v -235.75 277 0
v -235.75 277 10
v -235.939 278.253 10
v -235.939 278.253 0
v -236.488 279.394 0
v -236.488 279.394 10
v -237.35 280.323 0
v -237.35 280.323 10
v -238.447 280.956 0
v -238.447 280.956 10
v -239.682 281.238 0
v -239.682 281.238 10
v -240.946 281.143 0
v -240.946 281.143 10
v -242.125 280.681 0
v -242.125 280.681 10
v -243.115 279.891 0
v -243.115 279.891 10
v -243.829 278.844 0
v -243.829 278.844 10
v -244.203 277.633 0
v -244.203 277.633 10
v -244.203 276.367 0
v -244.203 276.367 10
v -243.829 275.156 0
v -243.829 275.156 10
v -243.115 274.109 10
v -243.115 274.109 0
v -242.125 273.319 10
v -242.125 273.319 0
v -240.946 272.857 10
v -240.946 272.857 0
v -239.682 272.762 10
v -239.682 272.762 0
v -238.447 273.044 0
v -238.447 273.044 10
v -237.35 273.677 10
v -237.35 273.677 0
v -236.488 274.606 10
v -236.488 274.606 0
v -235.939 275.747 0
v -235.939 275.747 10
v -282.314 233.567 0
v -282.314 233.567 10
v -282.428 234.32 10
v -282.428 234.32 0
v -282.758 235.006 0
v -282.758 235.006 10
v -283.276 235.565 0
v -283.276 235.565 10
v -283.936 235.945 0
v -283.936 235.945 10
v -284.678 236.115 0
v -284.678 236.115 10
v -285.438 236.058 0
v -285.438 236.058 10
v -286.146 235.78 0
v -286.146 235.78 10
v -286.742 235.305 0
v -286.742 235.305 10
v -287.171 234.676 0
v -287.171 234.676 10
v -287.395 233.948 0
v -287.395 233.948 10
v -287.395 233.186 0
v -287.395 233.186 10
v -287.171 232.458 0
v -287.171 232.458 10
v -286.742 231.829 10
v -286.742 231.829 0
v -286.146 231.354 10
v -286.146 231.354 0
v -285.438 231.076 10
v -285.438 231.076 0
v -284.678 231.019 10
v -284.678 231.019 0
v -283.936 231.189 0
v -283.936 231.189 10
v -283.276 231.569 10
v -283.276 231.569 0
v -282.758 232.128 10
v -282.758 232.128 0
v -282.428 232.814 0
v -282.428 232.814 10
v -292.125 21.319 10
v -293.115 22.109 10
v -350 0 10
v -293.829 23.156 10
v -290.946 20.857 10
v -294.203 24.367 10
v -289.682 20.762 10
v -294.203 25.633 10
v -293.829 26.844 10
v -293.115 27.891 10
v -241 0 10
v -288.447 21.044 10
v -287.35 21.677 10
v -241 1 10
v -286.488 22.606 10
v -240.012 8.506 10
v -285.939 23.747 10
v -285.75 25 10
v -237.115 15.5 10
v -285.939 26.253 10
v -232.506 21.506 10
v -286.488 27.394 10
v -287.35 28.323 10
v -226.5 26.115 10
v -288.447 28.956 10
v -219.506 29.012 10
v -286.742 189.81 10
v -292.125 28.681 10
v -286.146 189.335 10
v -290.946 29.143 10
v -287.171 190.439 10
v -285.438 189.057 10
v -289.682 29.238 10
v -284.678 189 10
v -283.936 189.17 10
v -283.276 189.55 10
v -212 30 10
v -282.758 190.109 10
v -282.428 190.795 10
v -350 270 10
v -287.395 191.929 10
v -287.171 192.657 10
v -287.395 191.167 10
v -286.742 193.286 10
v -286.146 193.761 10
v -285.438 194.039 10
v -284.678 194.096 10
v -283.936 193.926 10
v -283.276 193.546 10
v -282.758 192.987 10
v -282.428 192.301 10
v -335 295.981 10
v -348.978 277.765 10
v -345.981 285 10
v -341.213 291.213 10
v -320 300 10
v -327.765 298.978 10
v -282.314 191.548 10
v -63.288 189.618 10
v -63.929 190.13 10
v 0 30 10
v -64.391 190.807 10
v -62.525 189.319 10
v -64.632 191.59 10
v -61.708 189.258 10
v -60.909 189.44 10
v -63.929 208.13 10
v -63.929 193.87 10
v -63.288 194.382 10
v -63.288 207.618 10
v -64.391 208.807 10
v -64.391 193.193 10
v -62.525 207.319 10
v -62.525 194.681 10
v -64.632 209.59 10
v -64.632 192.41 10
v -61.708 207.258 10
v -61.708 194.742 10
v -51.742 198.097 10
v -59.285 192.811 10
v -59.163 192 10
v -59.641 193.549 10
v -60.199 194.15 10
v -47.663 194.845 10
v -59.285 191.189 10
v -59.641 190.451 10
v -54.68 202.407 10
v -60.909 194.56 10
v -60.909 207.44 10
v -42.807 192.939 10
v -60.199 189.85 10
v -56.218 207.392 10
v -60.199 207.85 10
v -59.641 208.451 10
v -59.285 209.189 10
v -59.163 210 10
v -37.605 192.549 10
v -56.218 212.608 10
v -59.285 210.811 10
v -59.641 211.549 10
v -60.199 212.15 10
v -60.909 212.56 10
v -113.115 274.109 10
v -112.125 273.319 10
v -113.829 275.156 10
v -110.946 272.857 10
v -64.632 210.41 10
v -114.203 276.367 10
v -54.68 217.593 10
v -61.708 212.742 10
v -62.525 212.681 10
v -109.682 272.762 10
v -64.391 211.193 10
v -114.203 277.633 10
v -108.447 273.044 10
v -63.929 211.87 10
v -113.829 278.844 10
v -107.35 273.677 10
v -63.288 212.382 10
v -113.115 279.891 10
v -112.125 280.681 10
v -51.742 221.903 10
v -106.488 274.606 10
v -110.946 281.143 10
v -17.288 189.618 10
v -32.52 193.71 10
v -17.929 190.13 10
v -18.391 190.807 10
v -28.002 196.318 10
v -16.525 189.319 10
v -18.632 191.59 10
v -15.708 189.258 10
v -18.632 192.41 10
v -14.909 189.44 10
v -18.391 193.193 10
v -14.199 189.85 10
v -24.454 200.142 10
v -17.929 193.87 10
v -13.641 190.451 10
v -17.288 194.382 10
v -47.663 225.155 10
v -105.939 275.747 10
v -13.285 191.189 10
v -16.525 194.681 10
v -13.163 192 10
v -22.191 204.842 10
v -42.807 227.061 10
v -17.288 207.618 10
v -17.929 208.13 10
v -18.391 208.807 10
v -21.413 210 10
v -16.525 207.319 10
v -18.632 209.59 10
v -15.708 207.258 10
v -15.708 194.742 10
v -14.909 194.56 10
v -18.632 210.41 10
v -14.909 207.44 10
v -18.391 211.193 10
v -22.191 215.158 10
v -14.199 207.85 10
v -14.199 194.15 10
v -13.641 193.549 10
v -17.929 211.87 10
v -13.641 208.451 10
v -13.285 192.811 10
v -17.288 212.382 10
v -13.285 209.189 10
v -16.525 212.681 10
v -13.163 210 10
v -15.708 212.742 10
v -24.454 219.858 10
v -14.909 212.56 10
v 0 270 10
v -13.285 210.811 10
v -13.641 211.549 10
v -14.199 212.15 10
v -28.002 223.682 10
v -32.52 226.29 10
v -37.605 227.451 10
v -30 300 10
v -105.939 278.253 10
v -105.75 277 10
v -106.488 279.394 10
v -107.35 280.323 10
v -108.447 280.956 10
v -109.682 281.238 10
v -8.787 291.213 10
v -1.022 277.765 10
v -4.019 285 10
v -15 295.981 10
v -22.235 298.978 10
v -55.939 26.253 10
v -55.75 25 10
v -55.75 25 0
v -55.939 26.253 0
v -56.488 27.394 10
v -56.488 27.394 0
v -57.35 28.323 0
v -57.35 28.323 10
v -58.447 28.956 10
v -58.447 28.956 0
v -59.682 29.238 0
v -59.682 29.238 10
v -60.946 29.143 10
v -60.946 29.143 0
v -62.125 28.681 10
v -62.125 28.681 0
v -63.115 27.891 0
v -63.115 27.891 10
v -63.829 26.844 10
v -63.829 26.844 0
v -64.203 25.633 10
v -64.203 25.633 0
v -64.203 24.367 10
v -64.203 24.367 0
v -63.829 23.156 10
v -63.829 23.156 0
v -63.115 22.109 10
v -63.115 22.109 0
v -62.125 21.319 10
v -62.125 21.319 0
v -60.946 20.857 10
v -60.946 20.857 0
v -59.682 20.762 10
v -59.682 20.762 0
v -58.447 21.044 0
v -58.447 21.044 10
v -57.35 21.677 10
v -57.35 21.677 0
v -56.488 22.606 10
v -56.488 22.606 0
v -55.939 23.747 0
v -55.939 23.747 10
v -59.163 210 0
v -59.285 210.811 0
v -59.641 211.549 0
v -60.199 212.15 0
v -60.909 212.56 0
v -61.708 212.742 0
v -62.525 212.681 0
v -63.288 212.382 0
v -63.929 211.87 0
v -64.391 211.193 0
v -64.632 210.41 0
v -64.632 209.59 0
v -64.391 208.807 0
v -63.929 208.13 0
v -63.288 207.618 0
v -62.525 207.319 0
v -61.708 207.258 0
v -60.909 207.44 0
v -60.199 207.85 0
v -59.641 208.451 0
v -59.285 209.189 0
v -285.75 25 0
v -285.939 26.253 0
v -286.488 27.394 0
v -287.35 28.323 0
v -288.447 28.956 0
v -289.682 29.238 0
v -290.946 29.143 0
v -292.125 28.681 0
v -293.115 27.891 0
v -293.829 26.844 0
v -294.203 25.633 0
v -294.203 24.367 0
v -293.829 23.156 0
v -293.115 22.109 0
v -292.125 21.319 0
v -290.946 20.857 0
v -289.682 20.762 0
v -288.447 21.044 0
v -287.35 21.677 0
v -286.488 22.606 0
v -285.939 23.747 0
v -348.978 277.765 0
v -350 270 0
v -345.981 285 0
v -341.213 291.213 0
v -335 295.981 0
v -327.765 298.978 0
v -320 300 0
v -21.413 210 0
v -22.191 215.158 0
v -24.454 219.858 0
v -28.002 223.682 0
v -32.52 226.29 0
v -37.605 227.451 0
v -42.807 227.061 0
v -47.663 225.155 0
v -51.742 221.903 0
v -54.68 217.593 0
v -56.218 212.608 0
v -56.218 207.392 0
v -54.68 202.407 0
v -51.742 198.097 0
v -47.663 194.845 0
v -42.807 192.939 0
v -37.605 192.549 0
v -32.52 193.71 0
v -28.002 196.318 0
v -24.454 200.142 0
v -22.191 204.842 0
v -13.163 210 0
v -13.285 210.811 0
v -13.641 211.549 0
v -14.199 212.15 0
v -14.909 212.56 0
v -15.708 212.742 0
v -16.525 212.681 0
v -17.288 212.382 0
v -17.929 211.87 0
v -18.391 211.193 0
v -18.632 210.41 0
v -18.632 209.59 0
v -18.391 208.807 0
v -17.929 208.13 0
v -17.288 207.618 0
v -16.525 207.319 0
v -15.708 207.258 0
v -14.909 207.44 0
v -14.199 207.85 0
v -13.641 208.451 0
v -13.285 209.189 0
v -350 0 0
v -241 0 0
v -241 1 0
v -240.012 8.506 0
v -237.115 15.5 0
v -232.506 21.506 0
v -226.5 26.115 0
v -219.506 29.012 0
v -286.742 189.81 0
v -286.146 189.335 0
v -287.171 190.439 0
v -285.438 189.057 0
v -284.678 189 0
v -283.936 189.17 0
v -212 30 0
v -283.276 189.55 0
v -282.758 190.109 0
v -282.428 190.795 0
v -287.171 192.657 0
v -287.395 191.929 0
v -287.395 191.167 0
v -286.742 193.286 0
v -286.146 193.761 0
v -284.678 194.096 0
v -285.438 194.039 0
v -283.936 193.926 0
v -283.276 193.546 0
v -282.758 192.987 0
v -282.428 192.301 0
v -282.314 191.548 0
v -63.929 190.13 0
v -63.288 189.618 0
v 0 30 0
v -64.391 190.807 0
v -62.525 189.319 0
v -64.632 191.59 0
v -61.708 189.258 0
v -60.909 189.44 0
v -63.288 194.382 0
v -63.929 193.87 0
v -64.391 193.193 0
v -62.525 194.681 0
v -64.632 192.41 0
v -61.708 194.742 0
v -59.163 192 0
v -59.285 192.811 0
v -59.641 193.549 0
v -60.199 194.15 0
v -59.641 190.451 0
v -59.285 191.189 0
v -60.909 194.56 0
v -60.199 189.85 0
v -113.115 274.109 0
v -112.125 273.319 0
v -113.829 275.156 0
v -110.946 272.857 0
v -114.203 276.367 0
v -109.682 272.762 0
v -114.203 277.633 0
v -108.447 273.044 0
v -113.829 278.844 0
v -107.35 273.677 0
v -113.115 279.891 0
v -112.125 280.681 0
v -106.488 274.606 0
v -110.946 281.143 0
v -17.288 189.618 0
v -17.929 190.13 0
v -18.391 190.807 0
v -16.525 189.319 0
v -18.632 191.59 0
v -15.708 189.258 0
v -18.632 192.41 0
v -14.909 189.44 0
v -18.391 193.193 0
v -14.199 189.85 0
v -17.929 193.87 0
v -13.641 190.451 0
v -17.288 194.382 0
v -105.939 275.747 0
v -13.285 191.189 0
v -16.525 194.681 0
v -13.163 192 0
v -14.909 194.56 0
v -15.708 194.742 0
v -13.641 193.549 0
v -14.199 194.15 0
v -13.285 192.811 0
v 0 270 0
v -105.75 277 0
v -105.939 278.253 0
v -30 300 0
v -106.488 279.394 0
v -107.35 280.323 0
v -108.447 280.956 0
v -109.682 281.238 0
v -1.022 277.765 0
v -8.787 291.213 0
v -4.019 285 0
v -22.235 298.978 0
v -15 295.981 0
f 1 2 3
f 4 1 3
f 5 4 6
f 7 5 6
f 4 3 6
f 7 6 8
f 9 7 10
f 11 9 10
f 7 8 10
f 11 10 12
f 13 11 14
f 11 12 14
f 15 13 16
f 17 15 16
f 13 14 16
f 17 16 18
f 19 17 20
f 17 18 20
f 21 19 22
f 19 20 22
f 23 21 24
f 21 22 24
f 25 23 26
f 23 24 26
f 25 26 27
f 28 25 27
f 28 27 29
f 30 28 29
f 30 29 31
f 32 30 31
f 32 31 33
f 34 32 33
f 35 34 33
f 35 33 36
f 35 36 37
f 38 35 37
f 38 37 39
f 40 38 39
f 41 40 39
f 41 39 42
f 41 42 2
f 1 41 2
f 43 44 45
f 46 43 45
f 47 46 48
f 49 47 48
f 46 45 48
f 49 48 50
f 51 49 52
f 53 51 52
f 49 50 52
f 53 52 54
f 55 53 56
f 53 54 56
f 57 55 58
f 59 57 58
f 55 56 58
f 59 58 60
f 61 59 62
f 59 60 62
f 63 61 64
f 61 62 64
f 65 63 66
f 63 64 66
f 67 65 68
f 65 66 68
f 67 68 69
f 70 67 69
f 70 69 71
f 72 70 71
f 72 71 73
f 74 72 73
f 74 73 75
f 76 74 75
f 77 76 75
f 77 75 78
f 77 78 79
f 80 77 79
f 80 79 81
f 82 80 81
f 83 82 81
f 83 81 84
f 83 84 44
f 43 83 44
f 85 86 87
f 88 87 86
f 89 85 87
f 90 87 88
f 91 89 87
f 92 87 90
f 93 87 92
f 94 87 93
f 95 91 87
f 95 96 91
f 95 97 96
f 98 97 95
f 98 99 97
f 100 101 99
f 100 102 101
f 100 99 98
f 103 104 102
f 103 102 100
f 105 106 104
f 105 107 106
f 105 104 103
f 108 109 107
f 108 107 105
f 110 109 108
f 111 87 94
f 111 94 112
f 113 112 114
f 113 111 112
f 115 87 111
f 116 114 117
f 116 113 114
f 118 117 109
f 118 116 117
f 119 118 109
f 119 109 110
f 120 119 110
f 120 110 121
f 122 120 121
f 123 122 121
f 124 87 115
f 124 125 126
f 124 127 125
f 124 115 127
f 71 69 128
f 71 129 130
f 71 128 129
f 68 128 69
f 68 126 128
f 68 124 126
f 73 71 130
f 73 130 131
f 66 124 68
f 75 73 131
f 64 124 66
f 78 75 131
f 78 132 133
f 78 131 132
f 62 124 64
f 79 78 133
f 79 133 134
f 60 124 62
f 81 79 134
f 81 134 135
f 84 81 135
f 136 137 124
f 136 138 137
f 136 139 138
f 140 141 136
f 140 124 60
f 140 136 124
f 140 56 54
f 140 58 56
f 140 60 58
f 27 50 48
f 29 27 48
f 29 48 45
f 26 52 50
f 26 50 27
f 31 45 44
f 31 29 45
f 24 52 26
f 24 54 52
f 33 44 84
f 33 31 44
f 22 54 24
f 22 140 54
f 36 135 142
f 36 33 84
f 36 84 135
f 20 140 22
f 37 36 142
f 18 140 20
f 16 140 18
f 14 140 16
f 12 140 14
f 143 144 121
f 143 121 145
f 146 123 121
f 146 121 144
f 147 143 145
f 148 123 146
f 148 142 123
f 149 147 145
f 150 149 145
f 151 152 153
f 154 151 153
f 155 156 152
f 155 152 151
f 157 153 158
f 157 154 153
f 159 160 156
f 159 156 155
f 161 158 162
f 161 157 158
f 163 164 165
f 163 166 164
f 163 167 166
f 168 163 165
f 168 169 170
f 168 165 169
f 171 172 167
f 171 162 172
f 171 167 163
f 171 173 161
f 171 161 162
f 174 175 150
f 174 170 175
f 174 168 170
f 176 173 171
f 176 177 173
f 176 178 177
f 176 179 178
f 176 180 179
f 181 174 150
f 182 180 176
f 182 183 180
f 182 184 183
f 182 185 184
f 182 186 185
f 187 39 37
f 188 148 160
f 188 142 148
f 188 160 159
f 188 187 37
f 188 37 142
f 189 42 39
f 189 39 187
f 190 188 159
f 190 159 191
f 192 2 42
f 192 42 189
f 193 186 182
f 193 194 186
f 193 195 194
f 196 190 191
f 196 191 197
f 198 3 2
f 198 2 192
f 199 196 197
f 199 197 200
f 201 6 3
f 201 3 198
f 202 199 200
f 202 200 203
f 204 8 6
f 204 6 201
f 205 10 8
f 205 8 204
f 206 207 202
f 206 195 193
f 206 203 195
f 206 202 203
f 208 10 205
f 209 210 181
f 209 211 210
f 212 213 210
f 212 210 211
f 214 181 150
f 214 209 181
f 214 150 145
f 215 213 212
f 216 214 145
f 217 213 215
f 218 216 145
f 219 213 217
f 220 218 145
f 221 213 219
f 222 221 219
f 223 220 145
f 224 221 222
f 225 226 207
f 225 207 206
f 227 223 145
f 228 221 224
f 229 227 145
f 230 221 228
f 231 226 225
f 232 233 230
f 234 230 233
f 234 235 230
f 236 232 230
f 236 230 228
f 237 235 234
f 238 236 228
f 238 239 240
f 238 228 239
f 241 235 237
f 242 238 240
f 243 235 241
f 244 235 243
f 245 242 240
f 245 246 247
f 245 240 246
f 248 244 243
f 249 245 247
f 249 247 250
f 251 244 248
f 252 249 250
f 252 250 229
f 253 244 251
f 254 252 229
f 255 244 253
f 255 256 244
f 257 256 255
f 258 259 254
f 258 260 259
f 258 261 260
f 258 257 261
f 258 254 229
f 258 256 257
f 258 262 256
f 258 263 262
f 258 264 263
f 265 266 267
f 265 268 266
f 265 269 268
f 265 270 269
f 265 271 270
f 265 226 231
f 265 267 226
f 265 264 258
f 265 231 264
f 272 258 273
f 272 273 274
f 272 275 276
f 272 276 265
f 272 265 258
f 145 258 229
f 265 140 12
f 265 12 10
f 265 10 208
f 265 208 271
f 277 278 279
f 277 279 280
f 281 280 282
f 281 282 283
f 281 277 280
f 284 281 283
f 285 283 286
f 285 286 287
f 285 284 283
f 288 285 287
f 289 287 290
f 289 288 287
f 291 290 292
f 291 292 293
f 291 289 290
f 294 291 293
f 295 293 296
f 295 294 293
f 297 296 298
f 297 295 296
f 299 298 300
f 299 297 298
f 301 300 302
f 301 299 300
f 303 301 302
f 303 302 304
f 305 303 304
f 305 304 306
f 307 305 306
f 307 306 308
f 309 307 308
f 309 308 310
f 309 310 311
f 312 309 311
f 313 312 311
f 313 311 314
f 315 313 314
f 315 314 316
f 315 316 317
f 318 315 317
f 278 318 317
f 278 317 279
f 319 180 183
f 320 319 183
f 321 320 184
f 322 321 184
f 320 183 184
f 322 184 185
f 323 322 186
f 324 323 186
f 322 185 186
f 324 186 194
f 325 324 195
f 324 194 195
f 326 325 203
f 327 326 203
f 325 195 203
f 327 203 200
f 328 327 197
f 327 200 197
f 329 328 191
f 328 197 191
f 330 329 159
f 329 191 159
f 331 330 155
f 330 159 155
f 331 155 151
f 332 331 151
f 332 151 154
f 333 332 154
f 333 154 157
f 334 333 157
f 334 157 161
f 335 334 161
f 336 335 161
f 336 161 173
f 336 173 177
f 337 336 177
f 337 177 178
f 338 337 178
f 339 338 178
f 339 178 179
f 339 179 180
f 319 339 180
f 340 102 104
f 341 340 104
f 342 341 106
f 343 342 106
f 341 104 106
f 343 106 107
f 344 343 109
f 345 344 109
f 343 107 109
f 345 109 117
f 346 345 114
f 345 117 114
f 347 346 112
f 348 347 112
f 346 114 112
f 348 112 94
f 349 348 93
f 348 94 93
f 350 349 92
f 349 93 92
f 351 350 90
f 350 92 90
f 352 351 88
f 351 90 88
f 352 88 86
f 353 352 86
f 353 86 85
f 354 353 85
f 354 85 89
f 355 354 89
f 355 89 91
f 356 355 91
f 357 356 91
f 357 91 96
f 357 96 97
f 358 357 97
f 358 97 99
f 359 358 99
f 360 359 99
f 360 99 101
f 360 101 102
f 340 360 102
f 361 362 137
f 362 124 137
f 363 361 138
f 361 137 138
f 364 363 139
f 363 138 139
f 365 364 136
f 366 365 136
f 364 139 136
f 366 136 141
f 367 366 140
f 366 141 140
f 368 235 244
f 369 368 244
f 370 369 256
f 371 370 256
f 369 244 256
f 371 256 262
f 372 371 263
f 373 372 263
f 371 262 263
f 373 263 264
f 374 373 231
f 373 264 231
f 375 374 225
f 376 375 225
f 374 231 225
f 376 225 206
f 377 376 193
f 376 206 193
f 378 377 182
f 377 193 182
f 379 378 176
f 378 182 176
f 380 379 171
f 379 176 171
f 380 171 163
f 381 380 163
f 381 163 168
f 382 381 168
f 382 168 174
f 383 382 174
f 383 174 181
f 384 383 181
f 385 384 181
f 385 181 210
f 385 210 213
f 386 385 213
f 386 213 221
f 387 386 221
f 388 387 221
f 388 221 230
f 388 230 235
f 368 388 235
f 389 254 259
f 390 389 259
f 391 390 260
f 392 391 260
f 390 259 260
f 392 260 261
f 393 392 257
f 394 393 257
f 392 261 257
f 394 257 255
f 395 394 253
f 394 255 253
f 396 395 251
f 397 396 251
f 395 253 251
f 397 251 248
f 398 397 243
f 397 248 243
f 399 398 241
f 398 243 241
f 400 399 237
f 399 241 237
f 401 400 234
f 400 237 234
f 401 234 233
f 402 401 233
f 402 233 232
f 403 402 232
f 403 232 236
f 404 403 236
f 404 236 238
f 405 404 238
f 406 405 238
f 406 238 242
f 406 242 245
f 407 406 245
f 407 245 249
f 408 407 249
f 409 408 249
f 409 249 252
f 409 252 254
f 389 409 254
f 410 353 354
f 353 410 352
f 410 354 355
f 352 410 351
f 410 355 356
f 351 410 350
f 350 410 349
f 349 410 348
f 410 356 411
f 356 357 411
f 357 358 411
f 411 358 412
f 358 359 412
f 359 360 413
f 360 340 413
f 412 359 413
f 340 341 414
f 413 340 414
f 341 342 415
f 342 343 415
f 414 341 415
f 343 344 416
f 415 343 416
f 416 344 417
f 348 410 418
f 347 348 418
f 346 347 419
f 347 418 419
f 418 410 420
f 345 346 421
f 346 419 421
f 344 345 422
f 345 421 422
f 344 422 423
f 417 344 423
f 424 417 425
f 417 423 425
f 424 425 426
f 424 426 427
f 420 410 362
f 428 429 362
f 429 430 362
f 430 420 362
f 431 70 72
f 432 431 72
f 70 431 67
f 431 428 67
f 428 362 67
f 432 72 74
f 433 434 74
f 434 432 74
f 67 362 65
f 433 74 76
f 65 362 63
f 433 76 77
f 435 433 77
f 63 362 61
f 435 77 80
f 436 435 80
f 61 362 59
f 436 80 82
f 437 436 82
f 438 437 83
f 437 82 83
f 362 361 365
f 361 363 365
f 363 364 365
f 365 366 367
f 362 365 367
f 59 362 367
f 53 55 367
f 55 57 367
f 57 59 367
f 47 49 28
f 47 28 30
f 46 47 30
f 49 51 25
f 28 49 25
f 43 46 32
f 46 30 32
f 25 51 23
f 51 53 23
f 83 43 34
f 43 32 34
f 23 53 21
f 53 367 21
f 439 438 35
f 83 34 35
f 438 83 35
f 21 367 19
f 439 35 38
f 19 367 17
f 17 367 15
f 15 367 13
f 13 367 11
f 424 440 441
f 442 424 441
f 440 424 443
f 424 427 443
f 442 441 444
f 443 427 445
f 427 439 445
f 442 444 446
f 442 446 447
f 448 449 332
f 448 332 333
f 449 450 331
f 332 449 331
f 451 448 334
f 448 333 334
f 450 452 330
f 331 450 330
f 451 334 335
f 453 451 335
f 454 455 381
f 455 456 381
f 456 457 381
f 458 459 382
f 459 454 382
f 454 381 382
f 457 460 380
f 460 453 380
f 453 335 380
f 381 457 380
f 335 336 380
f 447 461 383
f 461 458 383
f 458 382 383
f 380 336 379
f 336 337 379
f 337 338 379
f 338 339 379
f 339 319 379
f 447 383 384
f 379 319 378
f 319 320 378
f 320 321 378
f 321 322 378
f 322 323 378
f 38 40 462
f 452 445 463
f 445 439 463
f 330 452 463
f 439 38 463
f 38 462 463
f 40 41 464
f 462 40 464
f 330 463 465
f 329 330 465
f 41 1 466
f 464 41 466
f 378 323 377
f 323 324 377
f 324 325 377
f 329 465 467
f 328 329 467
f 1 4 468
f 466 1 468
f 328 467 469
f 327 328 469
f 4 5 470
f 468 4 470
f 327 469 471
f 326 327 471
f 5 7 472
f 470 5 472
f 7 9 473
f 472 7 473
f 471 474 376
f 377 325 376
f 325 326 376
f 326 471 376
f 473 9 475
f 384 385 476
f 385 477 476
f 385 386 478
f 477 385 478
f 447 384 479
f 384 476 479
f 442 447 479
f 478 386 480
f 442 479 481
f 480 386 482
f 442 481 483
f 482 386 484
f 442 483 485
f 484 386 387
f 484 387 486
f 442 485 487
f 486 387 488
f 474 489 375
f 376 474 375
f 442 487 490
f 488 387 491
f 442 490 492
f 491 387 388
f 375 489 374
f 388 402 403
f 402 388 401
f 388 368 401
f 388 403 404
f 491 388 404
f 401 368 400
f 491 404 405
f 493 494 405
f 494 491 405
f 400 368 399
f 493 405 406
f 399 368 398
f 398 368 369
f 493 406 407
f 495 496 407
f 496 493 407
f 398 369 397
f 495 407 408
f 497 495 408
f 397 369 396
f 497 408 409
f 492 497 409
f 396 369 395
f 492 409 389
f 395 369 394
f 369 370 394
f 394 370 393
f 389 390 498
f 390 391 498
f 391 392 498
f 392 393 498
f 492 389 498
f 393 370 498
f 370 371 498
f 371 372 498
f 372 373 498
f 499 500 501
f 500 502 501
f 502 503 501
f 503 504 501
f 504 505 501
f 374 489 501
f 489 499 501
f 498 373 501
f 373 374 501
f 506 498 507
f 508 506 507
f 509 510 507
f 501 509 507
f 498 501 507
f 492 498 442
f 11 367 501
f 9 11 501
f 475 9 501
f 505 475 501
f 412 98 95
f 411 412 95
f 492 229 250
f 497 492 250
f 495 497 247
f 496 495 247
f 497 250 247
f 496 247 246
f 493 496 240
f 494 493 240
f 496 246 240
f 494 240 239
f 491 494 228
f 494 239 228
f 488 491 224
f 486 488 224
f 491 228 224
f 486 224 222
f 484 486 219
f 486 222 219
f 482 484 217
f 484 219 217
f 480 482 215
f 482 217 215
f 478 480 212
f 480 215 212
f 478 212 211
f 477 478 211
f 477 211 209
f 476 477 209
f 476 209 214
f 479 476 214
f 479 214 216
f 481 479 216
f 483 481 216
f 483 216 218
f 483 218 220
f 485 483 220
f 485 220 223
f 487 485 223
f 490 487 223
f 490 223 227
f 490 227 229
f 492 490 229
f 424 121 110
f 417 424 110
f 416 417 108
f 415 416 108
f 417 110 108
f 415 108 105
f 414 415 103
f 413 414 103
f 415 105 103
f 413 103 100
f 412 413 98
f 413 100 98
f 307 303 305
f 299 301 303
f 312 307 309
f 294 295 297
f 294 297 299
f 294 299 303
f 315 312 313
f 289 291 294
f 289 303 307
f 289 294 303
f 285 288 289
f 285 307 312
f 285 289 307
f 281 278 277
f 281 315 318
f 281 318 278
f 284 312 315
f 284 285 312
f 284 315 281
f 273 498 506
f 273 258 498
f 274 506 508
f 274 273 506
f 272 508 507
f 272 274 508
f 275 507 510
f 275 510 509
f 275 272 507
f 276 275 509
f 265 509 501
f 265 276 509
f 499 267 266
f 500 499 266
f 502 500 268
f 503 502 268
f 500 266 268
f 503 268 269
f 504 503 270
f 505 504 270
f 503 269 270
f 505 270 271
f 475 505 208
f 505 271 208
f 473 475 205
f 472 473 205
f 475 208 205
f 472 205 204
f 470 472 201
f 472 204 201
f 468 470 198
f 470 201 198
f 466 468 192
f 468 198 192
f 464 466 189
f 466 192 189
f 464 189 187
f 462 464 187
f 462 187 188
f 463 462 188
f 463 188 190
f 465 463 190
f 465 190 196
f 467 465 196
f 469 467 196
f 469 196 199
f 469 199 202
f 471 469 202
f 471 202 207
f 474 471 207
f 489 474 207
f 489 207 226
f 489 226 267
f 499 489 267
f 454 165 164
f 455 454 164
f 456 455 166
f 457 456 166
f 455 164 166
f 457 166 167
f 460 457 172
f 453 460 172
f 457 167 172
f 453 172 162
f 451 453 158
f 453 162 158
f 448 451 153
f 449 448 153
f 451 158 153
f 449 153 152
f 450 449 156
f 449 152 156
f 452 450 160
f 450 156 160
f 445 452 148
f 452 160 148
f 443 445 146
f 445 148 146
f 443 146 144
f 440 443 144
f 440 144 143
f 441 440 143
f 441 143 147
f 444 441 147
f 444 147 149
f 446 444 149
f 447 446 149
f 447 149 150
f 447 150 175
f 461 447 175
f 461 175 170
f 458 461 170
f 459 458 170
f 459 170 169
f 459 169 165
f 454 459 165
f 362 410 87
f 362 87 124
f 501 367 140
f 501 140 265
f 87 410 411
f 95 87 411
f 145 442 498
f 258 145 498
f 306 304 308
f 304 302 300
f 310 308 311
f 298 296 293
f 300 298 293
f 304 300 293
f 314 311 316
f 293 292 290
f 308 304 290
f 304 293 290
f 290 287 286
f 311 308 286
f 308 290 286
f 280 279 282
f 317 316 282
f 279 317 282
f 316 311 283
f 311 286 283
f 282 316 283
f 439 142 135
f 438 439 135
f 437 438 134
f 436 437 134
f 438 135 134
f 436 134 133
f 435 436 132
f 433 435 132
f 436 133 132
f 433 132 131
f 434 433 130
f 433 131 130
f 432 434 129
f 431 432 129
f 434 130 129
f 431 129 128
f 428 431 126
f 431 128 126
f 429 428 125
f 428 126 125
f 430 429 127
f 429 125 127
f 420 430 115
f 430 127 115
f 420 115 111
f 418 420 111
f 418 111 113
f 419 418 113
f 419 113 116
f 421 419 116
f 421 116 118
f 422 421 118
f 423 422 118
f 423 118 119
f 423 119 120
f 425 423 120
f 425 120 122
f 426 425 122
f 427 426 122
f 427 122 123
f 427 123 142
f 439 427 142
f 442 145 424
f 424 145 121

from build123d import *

# Parameters (mm, degrees)
CROQUIS1_W              = 350
CROQUIS1_H              = 300
SALIENTE_EXTRUIR1_DEPTH = 10
REDONDEO4_R             = 30
CROQUIS2_R              = 17.5
CROQUIS2_R_2            = 4.25
CROQUIS2_R_3            = 2.555
CROQUIS2_R_4            = 2.75
CORTAR_EXTRUIR1_DEPTH   = 11


with BuildPart() as part:
    # Croquis1 → Saliente-Extruir1 (new body)
    with BuildSketch(Plane.XY):
        with Locations((-175, 150)):
            Rectangle(CROQUIS1_W, CROQUIS1_H)
    extrude(amount=SALIENTE_EXTRUIR1_DEPTH)

    # Redondeo4
    redondeo4_edges = [part.edges().sort_by_distance(p)[0] for p in [
        (-350, 300, 5),
        (0, 300, 5),
    ]]
    fillet(redondeo4_edges, radius=REDONDEO4_R)

    # Croquis2 → Cortar-Extruir1 (cut, through all)
    with BuildSketch(Plane.XY.offset(10)):
        with Locations((-38.913195394, 210)):
            Circle(CROQUIS2_R)
        with Locations((-290, 25)):
            Circle(CROQUIS2_R_2)
        with Locations((-240, 277)):
            Circle(CROQUIS2_R_2)
        with Locations((-110, 277)):
            Circle(CROQUIS2_R_2)
        with Locations((-355.107, 233.567)):
            Circle(CROQUIS2_R_3)
        with Locations((-284.869, 233.567)):
            Circle(CROQUIS2_R_3)
        with Locations((-284.869, 191.548)):
            Circle(CROQUIS2_R_3)
        with Locations((-355.107, 191.548)):
            Circle(CROQUIS2_R_3)
        with Locations((-15.913195394, 210)):
            Circle(CROQUIS2_R_4)
        with Locations((-15.913195394, 192)):
            Circle(CROQUIS2_R_4)
        with Locations((-61.913195394, 210)):
            Circle(CROQUIS2_R_4)
        with Locations((-61.913195394, 192)):
            Circle(CROQUIS2_R_4)
        with BuildLine():
            Line((-241, 0), (180.991, 0))
            Line((180.991, 0), (180.991, 1))
            ThreePointArc((180.991, 1), (172.497096654, 21.506096654), (151.991, 30))
            Line((151.991, 30), (-212, 30))
            ThreePointArc((-212, 30), (-232.506096654, 21.506096654), (-241, 1))
            Line((-241, 1), (-241, 0))
        make_face()
        with Locations((-60, 25)):
            Circle(CROQUIS2_R_2, mode=Mode.SUBTRACT)
    extrude(amount=-CORTAR_EXTRUIR1_DEPTH, mode=Mode.SUBTRACT)


solid = part.part
